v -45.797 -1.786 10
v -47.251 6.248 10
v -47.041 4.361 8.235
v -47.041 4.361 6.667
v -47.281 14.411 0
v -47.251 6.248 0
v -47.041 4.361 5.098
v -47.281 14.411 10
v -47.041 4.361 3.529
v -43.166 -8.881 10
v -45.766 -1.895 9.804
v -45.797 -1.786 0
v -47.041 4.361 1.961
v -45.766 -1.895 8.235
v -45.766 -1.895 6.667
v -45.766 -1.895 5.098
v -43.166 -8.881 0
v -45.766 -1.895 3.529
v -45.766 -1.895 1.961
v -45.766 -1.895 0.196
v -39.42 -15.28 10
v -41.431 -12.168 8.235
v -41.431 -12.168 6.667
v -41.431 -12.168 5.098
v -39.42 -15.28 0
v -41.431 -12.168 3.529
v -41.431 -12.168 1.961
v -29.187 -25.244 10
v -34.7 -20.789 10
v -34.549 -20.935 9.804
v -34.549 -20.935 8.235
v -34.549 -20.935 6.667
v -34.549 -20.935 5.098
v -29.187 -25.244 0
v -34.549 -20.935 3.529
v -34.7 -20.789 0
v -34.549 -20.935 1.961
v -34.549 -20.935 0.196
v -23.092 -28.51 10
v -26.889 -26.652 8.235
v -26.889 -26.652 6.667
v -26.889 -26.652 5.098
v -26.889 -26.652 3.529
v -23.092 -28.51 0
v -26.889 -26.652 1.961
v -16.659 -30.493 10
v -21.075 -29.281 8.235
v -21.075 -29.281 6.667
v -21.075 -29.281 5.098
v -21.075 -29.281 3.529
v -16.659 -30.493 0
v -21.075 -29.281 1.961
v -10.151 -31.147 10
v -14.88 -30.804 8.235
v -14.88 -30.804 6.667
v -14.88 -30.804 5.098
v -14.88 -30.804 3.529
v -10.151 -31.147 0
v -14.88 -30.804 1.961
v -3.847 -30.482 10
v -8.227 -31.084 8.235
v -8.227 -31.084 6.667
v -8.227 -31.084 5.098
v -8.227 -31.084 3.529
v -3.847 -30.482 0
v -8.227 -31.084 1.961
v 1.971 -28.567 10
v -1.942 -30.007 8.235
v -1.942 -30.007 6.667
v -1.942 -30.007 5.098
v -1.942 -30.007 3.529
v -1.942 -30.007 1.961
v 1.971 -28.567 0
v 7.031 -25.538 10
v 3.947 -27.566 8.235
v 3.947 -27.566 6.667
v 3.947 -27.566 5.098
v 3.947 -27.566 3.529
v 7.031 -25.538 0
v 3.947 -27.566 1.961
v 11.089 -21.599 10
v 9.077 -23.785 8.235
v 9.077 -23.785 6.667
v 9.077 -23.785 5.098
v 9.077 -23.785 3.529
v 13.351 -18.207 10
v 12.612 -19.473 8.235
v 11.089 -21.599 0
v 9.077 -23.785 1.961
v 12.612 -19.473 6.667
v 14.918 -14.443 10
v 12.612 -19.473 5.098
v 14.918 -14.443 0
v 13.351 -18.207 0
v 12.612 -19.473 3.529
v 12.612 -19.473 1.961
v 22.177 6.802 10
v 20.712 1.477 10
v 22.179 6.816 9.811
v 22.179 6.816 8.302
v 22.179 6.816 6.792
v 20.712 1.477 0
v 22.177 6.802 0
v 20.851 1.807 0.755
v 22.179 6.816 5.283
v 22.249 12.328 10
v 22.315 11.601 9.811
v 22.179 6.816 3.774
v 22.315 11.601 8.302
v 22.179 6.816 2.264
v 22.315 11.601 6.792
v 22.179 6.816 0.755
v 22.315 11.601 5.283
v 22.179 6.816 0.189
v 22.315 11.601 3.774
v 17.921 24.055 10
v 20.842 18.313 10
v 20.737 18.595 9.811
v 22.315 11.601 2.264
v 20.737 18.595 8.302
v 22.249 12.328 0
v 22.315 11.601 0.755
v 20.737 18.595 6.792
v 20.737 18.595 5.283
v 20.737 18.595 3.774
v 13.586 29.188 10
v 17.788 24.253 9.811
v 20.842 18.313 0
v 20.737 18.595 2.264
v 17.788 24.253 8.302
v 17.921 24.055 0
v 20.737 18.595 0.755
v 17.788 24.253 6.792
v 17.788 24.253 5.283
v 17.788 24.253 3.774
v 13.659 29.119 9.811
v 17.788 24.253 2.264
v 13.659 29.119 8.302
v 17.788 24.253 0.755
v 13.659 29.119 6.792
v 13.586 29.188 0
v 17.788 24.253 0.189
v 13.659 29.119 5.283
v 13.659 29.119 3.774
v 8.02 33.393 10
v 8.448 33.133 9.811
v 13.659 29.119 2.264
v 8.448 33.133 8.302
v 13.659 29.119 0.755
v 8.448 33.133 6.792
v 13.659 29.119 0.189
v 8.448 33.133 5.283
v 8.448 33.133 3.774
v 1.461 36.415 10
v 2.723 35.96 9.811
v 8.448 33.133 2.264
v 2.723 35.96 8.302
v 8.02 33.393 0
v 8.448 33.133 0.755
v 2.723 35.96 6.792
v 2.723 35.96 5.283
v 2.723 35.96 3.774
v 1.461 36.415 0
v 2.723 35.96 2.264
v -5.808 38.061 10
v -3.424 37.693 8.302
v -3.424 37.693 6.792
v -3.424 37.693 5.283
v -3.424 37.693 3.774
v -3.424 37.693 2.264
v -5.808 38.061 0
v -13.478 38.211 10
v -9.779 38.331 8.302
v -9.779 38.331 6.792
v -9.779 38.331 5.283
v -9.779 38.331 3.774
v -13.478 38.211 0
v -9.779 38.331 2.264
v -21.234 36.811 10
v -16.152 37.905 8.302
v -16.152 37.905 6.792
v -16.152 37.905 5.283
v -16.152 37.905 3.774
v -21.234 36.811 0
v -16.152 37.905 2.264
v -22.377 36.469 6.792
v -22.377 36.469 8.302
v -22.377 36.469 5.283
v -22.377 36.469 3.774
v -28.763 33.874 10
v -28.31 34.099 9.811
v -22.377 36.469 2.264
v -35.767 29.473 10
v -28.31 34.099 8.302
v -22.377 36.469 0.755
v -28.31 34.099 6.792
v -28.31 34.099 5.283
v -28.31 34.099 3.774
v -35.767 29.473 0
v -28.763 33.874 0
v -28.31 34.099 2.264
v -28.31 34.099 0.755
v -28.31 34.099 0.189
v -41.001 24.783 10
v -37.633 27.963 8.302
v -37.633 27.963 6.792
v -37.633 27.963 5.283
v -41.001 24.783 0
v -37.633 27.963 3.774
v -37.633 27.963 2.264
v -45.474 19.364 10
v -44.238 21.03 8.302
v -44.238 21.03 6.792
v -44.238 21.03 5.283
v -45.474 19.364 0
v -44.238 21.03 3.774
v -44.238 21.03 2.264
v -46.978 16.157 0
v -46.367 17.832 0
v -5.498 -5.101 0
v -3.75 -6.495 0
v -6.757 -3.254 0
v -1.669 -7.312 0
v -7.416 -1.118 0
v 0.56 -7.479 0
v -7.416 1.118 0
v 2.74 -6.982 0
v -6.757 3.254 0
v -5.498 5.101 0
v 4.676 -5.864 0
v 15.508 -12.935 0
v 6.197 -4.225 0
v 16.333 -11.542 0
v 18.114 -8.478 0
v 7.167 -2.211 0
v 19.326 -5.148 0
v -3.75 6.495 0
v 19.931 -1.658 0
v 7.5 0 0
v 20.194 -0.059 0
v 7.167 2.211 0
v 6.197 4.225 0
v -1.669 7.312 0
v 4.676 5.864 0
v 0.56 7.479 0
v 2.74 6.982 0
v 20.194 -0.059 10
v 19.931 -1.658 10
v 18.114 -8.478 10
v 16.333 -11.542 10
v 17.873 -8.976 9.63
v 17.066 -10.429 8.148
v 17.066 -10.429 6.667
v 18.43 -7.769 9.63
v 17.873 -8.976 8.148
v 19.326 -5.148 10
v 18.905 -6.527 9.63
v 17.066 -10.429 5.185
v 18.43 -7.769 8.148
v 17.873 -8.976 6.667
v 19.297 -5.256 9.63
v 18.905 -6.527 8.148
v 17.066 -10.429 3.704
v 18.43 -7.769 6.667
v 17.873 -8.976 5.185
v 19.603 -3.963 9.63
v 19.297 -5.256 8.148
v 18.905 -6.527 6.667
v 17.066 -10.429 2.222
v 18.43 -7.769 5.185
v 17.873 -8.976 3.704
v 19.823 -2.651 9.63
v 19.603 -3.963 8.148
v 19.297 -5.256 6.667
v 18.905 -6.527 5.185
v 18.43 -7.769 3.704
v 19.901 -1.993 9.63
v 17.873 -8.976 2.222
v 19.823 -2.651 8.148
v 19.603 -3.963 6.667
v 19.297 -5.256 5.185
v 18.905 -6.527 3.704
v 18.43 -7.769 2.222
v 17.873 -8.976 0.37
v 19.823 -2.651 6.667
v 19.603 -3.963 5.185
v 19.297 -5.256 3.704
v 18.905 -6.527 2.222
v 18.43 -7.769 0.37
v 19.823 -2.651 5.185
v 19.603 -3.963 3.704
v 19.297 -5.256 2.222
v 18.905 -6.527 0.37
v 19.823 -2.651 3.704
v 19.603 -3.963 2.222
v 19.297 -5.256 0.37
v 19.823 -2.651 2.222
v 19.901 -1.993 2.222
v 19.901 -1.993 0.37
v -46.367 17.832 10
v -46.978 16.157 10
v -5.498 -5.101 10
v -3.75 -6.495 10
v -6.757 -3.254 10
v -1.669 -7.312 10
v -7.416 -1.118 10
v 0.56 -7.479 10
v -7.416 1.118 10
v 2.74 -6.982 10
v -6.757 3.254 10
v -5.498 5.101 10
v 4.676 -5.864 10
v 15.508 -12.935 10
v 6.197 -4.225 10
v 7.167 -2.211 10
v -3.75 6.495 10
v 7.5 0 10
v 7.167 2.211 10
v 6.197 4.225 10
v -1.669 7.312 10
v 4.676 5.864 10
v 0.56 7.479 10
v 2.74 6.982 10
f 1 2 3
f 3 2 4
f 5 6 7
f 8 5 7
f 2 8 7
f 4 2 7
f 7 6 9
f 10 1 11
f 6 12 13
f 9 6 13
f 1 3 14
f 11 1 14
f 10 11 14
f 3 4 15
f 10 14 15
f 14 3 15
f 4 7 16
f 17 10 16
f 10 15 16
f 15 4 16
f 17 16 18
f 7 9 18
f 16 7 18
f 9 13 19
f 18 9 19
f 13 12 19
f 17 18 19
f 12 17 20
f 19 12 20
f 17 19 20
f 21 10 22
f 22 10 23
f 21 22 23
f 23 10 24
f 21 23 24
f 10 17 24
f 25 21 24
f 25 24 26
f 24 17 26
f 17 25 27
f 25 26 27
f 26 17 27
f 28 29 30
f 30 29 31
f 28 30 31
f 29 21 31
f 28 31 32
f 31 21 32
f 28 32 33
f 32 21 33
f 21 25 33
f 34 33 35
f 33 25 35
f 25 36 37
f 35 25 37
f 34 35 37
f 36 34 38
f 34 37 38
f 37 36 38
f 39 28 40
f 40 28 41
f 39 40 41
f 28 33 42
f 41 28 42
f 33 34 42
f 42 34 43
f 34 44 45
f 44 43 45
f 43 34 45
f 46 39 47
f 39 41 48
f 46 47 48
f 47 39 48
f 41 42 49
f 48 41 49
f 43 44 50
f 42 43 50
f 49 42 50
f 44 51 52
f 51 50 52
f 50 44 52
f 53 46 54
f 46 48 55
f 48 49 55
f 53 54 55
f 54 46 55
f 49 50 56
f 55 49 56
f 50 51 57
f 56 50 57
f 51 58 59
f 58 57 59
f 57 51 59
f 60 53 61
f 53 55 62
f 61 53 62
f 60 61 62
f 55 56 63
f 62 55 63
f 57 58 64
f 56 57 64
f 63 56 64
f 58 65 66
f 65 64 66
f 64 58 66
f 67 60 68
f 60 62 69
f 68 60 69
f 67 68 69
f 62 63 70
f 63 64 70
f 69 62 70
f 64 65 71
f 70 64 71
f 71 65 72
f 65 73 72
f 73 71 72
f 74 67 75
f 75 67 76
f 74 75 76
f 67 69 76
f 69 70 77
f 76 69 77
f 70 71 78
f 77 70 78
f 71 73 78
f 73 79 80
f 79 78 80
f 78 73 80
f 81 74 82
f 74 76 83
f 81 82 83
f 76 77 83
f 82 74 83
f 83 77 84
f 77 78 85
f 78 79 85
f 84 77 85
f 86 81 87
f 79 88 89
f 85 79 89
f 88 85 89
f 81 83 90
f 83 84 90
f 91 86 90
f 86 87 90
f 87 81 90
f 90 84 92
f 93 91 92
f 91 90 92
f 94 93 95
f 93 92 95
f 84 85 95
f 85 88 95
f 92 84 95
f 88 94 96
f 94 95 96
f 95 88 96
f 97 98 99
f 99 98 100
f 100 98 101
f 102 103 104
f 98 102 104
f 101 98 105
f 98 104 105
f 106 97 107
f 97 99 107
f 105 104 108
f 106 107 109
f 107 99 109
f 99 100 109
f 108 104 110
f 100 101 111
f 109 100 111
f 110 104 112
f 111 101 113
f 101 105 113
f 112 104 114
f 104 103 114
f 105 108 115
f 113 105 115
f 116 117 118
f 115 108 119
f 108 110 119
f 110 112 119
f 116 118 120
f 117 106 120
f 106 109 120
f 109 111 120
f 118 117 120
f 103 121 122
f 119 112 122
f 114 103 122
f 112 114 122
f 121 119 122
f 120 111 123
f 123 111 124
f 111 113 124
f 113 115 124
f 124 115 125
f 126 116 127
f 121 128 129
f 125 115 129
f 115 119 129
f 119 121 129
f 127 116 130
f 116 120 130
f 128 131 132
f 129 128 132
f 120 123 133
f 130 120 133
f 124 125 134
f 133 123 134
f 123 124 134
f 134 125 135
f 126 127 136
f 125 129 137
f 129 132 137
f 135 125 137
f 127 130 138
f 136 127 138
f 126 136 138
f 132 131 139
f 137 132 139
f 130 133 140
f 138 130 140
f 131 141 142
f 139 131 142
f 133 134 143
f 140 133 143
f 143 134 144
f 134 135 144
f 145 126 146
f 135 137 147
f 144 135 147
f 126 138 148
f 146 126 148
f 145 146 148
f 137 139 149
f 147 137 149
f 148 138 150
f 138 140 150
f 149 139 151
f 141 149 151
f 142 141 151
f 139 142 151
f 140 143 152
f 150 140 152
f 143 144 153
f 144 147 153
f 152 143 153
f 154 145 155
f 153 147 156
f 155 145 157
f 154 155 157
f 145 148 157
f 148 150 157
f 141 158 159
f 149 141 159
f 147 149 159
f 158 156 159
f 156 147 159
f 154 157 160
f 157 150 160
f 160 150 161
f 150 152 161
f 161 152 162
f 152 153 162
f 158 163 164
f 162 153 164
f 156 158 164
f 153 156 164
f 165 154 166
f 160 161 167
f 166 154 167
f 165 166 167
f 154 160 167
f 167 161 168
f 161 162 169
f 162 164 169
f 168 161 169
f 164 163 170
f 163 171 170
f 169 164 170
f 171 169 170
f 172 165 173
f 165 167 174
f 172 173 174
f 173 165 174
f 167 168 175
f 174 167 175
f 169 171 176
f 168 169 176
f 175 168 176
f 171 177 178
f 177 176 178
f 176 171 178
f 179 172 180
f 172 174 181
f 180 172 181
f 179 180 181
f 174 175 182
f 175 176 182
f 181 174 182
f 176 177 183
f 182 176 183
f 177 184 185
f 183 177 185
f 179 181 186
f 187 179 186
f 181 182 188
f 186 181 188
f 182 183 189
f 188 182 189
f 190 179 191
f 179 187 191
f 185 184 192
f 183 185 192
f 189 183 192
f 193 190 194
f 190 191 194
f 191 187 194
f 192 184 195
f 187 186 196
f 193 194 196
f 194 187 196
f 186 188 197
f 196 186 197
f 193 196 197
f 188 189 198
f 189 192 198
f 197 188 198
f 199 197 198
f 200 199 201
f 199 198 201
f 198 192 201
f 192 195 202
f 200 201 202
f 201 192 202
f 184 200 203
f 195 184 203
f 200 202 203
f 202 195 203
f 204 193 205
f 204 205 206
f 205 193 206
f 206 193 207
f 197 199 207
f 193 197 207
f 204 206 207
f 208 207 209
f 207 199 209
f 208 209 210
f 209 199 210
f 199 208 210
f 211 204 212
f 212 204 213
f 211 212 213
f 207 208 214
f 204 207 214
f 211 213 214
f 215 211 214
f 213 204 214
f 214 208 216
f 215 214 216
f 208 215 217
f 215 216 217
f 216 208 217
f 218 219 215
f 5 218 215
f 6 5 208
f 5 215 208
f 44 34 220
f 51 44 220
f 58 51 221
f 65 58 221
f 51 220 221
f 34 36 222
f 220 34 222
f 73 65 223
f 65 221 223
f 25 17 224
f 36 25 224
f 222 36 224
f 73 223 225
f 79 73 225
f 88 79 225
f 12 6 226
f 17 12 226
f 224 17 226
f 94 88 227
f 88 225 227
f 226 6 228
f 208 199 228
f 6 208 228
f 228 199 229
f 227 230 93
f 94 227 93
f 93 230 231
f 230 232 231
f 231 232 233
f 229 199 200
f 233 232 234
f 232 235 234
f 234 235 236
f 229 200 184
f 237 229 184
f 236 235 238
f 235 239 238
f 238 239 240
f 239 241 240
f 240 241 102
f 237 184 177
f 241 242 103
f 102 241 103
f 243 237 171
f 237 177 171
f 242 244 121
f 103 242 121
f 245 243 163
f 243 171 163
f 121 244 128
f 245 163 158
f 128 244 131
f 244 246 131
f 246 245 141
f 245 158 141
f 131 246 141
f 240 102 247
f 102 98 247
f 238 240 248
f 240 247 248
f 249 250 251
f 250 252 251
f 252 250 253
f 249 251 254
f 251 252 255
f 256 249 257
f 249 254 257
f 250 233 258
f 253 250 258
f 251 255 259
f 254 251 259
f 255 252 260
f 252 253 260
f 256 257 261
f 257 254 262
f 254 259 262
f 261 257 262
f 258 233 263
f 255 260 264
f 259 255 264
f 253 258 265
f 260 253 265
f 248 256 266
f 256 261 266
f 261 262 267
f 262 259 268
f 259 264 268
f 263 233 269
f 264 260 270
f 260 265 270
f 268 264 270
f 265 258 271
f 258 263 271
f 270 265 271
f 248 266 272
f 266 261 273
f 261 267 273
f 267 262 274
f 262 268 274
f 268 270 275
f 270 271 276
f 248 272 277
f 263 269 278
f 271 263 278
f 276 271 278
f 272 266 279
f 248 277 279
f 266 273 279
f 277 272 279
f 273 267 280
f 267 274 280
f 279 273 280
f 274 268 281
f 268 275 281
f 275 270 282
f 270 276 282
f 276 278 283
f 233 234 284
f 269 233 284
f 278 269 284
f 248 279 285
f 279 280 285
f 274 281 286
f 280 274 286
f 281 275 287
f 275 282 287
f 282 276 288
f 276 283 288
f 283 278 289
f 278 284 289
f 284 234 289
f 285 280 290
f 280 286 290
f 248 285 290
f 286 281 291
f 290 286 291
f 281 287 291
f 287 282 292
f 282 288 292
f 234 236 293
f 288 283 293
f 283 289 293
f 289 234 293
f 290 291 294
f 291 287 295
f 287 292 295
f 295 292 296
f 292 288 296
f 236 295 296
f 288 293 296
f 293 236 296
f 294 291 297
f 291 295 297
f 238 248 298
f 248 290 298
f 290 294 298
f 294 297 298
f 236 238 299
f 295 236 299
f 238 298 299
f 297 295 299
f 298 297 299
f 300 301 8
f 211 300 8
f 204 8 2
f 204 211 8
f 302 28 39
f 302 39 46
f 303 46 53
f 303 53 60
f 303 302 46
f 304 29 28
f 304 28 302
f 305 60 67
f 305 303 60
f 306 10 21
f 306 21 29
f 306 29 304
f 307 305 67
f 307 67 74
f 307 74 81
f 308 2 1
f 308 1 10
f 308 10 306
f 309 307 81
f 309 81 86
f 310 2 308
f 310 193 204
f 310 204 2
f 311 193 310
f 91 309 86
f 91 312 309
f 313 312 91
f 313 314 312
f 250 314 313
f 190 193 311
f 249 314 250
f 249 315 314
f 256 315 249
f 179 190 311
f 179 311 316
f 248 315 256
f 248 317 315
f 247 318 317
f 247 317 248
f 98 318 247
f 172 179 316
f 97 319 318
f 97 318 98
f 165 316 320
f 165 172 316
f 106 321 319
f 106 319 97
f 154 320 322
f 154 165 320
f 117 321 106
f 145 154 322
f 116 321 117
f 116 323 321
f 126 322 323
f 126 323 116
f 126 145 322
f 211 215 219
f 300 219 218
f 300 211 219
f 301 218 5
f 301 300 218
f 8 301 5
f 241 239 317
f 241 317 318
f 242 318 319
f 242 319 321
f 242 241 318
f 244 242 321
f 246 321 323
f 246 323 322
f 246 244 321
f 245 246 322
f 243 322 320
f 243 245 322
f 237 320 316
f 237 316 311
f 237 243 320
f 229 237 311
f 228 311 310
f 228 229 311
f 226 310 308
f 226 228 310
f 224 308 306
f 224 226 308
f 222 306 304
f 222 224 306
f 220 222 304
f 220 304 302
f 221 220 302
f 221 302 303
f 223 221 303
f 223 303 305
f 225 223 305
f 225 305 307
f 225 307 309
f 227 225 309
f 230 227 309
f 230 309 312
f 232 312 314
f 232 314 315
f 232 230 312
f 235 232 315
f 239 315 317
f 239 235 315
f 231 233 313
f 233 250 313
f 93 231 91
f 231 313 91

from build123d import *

# Parameters (mm, degrees)
SKETCH1_R           = 7.5
BOSS_EXTRUDE2_DEPTH = 10
FILLET1_R           = 10


with BuildPart() as part:
    # Sketch1 → Boss-Extrude2 (new body)
    with BuildSketch(Plane.XY):
        with BuildLine():
            add(Edge.make_bspline(
                [(20, 0), (20.020409748, 0.037996513), (20.060928024, 0.114187014), (20.12964942, 0.245531013), (20.227524178, 0.436799942), (20.320803466, 0.624005393), (20.408101904, 0.80454476), (20.513131341, 1.028153853), (20.636379782, 1.30013819), (20.775890348, 1.622275603), (20.964561763, 2.084363584), (21.176160839, 2.645597494), (21.400762948, 3.308060339), (21.627348817, 4.074879511), (21.82387956, 4.849852237), (21.990628499, 5.631814908), (22.127804945, 6.419471307), (22.343605386, 8.00388274), (22.444295112, 10.004224504), (22.324306643, 12.205875028), (21.865414458, 14.9688026), (21.194781507, 17.482815576), (20.196975773, 20.103806606), (18.711348901, 22.943135572), (16.913850005, 25.595374807), (14.83803254, 28.035320632), (12.481825943, 30.276438116), (9.905551794, 32.260621181), (7.143058118, 33.975373516), (3.508895363, 35.76599482), (-1.037505048, 37.342198382), (-5.776049389, 38.226758726), (-10.58060247, 38.430948462), (-14.572645562, 38.161653345), (-17.738378195, 37.689516547), (-20.856812898, 36.968897142), (-23.909970253, 36.009023208), (-26.881276298, 34.820013511), (-29.755513368, 33.41273371), (-32.518812511, 31.798646577), (-34.82859609, 30.215871445), (-36.724133372, 28.745155323), (-38.244357448, 27.447549659), (-39.423774282, 26.367755023), (-40.565156508, 25.248103031), (-41.667740599, 24.089758356), (-42.597224858, 23.04452492), (-43.368854904, 22.125890975), (-44.11890301, 21.191619014), (-44.849652331, 20.238158336), (-45.491908008, 19.351069223), (-46.0606176, 18.522333813), (-46.44278908, 17.945992785), (-46.663264674, 17.607165405), (-46.845252854, 17.321947665), (-46.938757793, 17.174061248), (-46.984631039, 17.101007167)],
                knots=[0.050324208, 0.050324208, 0.050324208, 0.050324208, 0.050324208, 0.052007215, 0.053690221, 0.055373228, 0.057056234, 0.058739241, 0.060422248, 0.063788261, 0.067154274, 0.070520287, 0.077252313, 0.083984355, 0.090716396, 0.097448438, 0.10418048, 0.110912521, 0.117644561, 0.151304782, 0.171500944, 0.184965059, 0.211893341, 0.238821591, 0.265749806, 0.292678076, 0.319606256, 0.346534414, 0.375101607, 0.402029829, 0.428958051, 0.48281442, 0.536670848, 0.563599055, 0.590527261, 0.61745547, 0.644383679, 0.671311911, 0.698240144, 0.725168325, 0.752096507, 0.779024722, 0.79248883, 0.805952937, 0.819417041, 0.832881144, 0.846345248, 0.859809351, 0.866541414, 0.873273478, 0.886737604, 0.900201731, 0.903567763, 0.906933794, 0.910299826, 0.913665858, 0.913665858, 0.913665858, 0.913665858, 0.913665858], degree=4))
            add(Edge.make_bspline(
                [(-46.984631039, 17.101007167), (-47.008245687, 16.930252773), (-47.052453505, 16.594747959), (-47.14772288, 15.834487365), (-47.214528259, 15.160715188), (-47.293965593, 14.299779503), (-47.346314657, 13.538629173), (-47.392988991, 12.722186285), (-47.422468156, 11.933538608), (-47.444946495, 10.930726825), (-47.444010053, 9.735376393), (-47.404361039, 8.336368598), (-47.304511764, 6.742720001), (-47.111846077, 4.754565727), (-46.771162846, 2.38206492), (-46.213481433, -0.359572326), (-45.355872486, -3.439660234), (-44.413431344, -6.073991193), (-43.469633124, -8.277605724), (-42.593502891, -10.072305051), (-41.839303321, -11.480778659), (-40.830669548, -13.204502076), (-39.516241362, -15.209384647), (-37.834348338, -17.445666738), (-35.716475971, -19.841921409), (-32.836422898, -22.614479765), (-29.03089004, -25.547737865), (-24.838756286, -27.918909191), (-20.349017446, -29.638470379), (-16.397837157, -30.613103542), (-13.160898489, -31.080464427), (-9.892857606, -31.217237714), (-6.628606497, -31.010938023), (-3.473189469, -30.47401424), (-0.394676097, -29.596112443), (2.565112202, -28.37500671), (5.36075444, -26.812990946), (7.781768771, -25.036326324), (9.9742179, -22.985943497), (11.63958792, -20.986683376), (12.748810807, -19.3214148), (13.515819977, -17.919279199), (13.906378968, -17.109859569), (14.149100741, -16.562152771), (14.339295058, -16.100610712), (14.484089284, -15.728391771), (14.621373048, -15.353433154), (14.751011091, -14.975917501), (14.873112977, -14.594855978), (14.987276237, -14.211724793), (15.091962981, -13.833461004), (15.191298738, -13.439798185), (15.266942281, -13.107906017), (15.303325903, -12.940133069), (15.320888863, -12.855752194)],
                knots=[0.086334142, 0.086334142, 0.086334142, 0.086334142, 0.086334142, 0.093060515, 0.099786888, 0.10651326, 0.113239633, 0.119966006, 0.126692378, 0.133418751, 0.140145123, 0.153597846, 0.167050569, 0.180503291, 0.193956014, 0.220861466, 0.247766918, 0.274672338, 0.301577759, 0.315030493, 0.328483227, 0.341935962, 0.355388696, 0.382294142, 0.409199588, 0.436105031, 0.463010473, 0.516821378, 0.570632207, 0.597537677, 0.624443147, 0.653716038, 0.680621422, 0.707526854, 0.734432293, 0.761337694, 0.788243181, 0.815148711, 0.842054217, 0.862233312, 0.889138718, 0.902591415, 0.909317764, 0.916044113, 0.919407288, 0.922770462, 0.926133629, 0.929496795, 0.932859961, 0.936223127, 0.939586294, 0.94294946, 0.946312626, 0.949675792, 0.949675792, 0.949675792, 0.949675792, 0.949675792], degree=4))
            add(Edge.make_bspline(
                [(15.320888863, -12.855752194), (15.365482074, -12.802608074), (15.453982567, -12.695704505), (15.663171852, -12.439954999), (15.827525813, -12.226893605), (16.052433323, -11.933079522), (16.234262328, -11.682018392), (16.434764749, -11.400135846), (16.616884894, -11.131589611), (16.802556699, -10.850279333), (16.979014347, -10.571395037), (17.196540035, -10.215824071), (17.44658158, -9.785182904), (17.725195173, -9.273842637), (18.023456431, -8.679695549), (18.302106839, -8.075852302), (18.560352889, -7.462892724), (18.798195449, -6.842210014), (19.015199451, -6.212979877), (19.211229439, -5.578581169), (19.386005403, -4.935179764), (19.539372739, -4.291022665), (19.671138501, -3.634366779), (19.781171398, -2.986524336), (19.869341032, -2.3139722), (19.935555478, -1.675574724), (19.974215132, -1.055908566), (19.993553165, -0.61958797), (19.999079015, -0.206445905), (20, -0.069374722), (20, 0)],
                knots=[0.08263773, 0.08263773, 0.08263773, 0.08263773, 0.08263773, 0.102512123, 0.122386517, 0.142260911, 0.162135305, 0.182009699, 0.201884093, 0.221758486, 0.24163288, 0.261507274, 0.281381668, 0.321130456, 0.360879243, 0.400628031, 0.440376819, 0.480125606, 0.519874394, 0.559623181, 0.599371969, 0.639120757, 0.678869544, 0.718618332, 0.75836712, 0.798115907, 0.837864695, 0.877613483, 0.897487877, 0.91736227, 0.91736227, 0.91736227, 0.91736227, 0.91736227], degree=4))
        make_face()
        Circle(SKETCH1_R, mode=Mode.SUBTRACT)
    extrude(amount=BOSS_EXTRUDE2_DEPTH)

    # Fillet1
    fillet1_edges = [part.edges().sort_by_distance(p)[0] for p in [
        (-46.984631039, 17.101007167, 5),
        (15.320888863, -12.855752194, 5),
        (20, 0, 5),
    ]]
    fillet(fillet1_edges, radius=FILLET1_R)


solid = part.part
